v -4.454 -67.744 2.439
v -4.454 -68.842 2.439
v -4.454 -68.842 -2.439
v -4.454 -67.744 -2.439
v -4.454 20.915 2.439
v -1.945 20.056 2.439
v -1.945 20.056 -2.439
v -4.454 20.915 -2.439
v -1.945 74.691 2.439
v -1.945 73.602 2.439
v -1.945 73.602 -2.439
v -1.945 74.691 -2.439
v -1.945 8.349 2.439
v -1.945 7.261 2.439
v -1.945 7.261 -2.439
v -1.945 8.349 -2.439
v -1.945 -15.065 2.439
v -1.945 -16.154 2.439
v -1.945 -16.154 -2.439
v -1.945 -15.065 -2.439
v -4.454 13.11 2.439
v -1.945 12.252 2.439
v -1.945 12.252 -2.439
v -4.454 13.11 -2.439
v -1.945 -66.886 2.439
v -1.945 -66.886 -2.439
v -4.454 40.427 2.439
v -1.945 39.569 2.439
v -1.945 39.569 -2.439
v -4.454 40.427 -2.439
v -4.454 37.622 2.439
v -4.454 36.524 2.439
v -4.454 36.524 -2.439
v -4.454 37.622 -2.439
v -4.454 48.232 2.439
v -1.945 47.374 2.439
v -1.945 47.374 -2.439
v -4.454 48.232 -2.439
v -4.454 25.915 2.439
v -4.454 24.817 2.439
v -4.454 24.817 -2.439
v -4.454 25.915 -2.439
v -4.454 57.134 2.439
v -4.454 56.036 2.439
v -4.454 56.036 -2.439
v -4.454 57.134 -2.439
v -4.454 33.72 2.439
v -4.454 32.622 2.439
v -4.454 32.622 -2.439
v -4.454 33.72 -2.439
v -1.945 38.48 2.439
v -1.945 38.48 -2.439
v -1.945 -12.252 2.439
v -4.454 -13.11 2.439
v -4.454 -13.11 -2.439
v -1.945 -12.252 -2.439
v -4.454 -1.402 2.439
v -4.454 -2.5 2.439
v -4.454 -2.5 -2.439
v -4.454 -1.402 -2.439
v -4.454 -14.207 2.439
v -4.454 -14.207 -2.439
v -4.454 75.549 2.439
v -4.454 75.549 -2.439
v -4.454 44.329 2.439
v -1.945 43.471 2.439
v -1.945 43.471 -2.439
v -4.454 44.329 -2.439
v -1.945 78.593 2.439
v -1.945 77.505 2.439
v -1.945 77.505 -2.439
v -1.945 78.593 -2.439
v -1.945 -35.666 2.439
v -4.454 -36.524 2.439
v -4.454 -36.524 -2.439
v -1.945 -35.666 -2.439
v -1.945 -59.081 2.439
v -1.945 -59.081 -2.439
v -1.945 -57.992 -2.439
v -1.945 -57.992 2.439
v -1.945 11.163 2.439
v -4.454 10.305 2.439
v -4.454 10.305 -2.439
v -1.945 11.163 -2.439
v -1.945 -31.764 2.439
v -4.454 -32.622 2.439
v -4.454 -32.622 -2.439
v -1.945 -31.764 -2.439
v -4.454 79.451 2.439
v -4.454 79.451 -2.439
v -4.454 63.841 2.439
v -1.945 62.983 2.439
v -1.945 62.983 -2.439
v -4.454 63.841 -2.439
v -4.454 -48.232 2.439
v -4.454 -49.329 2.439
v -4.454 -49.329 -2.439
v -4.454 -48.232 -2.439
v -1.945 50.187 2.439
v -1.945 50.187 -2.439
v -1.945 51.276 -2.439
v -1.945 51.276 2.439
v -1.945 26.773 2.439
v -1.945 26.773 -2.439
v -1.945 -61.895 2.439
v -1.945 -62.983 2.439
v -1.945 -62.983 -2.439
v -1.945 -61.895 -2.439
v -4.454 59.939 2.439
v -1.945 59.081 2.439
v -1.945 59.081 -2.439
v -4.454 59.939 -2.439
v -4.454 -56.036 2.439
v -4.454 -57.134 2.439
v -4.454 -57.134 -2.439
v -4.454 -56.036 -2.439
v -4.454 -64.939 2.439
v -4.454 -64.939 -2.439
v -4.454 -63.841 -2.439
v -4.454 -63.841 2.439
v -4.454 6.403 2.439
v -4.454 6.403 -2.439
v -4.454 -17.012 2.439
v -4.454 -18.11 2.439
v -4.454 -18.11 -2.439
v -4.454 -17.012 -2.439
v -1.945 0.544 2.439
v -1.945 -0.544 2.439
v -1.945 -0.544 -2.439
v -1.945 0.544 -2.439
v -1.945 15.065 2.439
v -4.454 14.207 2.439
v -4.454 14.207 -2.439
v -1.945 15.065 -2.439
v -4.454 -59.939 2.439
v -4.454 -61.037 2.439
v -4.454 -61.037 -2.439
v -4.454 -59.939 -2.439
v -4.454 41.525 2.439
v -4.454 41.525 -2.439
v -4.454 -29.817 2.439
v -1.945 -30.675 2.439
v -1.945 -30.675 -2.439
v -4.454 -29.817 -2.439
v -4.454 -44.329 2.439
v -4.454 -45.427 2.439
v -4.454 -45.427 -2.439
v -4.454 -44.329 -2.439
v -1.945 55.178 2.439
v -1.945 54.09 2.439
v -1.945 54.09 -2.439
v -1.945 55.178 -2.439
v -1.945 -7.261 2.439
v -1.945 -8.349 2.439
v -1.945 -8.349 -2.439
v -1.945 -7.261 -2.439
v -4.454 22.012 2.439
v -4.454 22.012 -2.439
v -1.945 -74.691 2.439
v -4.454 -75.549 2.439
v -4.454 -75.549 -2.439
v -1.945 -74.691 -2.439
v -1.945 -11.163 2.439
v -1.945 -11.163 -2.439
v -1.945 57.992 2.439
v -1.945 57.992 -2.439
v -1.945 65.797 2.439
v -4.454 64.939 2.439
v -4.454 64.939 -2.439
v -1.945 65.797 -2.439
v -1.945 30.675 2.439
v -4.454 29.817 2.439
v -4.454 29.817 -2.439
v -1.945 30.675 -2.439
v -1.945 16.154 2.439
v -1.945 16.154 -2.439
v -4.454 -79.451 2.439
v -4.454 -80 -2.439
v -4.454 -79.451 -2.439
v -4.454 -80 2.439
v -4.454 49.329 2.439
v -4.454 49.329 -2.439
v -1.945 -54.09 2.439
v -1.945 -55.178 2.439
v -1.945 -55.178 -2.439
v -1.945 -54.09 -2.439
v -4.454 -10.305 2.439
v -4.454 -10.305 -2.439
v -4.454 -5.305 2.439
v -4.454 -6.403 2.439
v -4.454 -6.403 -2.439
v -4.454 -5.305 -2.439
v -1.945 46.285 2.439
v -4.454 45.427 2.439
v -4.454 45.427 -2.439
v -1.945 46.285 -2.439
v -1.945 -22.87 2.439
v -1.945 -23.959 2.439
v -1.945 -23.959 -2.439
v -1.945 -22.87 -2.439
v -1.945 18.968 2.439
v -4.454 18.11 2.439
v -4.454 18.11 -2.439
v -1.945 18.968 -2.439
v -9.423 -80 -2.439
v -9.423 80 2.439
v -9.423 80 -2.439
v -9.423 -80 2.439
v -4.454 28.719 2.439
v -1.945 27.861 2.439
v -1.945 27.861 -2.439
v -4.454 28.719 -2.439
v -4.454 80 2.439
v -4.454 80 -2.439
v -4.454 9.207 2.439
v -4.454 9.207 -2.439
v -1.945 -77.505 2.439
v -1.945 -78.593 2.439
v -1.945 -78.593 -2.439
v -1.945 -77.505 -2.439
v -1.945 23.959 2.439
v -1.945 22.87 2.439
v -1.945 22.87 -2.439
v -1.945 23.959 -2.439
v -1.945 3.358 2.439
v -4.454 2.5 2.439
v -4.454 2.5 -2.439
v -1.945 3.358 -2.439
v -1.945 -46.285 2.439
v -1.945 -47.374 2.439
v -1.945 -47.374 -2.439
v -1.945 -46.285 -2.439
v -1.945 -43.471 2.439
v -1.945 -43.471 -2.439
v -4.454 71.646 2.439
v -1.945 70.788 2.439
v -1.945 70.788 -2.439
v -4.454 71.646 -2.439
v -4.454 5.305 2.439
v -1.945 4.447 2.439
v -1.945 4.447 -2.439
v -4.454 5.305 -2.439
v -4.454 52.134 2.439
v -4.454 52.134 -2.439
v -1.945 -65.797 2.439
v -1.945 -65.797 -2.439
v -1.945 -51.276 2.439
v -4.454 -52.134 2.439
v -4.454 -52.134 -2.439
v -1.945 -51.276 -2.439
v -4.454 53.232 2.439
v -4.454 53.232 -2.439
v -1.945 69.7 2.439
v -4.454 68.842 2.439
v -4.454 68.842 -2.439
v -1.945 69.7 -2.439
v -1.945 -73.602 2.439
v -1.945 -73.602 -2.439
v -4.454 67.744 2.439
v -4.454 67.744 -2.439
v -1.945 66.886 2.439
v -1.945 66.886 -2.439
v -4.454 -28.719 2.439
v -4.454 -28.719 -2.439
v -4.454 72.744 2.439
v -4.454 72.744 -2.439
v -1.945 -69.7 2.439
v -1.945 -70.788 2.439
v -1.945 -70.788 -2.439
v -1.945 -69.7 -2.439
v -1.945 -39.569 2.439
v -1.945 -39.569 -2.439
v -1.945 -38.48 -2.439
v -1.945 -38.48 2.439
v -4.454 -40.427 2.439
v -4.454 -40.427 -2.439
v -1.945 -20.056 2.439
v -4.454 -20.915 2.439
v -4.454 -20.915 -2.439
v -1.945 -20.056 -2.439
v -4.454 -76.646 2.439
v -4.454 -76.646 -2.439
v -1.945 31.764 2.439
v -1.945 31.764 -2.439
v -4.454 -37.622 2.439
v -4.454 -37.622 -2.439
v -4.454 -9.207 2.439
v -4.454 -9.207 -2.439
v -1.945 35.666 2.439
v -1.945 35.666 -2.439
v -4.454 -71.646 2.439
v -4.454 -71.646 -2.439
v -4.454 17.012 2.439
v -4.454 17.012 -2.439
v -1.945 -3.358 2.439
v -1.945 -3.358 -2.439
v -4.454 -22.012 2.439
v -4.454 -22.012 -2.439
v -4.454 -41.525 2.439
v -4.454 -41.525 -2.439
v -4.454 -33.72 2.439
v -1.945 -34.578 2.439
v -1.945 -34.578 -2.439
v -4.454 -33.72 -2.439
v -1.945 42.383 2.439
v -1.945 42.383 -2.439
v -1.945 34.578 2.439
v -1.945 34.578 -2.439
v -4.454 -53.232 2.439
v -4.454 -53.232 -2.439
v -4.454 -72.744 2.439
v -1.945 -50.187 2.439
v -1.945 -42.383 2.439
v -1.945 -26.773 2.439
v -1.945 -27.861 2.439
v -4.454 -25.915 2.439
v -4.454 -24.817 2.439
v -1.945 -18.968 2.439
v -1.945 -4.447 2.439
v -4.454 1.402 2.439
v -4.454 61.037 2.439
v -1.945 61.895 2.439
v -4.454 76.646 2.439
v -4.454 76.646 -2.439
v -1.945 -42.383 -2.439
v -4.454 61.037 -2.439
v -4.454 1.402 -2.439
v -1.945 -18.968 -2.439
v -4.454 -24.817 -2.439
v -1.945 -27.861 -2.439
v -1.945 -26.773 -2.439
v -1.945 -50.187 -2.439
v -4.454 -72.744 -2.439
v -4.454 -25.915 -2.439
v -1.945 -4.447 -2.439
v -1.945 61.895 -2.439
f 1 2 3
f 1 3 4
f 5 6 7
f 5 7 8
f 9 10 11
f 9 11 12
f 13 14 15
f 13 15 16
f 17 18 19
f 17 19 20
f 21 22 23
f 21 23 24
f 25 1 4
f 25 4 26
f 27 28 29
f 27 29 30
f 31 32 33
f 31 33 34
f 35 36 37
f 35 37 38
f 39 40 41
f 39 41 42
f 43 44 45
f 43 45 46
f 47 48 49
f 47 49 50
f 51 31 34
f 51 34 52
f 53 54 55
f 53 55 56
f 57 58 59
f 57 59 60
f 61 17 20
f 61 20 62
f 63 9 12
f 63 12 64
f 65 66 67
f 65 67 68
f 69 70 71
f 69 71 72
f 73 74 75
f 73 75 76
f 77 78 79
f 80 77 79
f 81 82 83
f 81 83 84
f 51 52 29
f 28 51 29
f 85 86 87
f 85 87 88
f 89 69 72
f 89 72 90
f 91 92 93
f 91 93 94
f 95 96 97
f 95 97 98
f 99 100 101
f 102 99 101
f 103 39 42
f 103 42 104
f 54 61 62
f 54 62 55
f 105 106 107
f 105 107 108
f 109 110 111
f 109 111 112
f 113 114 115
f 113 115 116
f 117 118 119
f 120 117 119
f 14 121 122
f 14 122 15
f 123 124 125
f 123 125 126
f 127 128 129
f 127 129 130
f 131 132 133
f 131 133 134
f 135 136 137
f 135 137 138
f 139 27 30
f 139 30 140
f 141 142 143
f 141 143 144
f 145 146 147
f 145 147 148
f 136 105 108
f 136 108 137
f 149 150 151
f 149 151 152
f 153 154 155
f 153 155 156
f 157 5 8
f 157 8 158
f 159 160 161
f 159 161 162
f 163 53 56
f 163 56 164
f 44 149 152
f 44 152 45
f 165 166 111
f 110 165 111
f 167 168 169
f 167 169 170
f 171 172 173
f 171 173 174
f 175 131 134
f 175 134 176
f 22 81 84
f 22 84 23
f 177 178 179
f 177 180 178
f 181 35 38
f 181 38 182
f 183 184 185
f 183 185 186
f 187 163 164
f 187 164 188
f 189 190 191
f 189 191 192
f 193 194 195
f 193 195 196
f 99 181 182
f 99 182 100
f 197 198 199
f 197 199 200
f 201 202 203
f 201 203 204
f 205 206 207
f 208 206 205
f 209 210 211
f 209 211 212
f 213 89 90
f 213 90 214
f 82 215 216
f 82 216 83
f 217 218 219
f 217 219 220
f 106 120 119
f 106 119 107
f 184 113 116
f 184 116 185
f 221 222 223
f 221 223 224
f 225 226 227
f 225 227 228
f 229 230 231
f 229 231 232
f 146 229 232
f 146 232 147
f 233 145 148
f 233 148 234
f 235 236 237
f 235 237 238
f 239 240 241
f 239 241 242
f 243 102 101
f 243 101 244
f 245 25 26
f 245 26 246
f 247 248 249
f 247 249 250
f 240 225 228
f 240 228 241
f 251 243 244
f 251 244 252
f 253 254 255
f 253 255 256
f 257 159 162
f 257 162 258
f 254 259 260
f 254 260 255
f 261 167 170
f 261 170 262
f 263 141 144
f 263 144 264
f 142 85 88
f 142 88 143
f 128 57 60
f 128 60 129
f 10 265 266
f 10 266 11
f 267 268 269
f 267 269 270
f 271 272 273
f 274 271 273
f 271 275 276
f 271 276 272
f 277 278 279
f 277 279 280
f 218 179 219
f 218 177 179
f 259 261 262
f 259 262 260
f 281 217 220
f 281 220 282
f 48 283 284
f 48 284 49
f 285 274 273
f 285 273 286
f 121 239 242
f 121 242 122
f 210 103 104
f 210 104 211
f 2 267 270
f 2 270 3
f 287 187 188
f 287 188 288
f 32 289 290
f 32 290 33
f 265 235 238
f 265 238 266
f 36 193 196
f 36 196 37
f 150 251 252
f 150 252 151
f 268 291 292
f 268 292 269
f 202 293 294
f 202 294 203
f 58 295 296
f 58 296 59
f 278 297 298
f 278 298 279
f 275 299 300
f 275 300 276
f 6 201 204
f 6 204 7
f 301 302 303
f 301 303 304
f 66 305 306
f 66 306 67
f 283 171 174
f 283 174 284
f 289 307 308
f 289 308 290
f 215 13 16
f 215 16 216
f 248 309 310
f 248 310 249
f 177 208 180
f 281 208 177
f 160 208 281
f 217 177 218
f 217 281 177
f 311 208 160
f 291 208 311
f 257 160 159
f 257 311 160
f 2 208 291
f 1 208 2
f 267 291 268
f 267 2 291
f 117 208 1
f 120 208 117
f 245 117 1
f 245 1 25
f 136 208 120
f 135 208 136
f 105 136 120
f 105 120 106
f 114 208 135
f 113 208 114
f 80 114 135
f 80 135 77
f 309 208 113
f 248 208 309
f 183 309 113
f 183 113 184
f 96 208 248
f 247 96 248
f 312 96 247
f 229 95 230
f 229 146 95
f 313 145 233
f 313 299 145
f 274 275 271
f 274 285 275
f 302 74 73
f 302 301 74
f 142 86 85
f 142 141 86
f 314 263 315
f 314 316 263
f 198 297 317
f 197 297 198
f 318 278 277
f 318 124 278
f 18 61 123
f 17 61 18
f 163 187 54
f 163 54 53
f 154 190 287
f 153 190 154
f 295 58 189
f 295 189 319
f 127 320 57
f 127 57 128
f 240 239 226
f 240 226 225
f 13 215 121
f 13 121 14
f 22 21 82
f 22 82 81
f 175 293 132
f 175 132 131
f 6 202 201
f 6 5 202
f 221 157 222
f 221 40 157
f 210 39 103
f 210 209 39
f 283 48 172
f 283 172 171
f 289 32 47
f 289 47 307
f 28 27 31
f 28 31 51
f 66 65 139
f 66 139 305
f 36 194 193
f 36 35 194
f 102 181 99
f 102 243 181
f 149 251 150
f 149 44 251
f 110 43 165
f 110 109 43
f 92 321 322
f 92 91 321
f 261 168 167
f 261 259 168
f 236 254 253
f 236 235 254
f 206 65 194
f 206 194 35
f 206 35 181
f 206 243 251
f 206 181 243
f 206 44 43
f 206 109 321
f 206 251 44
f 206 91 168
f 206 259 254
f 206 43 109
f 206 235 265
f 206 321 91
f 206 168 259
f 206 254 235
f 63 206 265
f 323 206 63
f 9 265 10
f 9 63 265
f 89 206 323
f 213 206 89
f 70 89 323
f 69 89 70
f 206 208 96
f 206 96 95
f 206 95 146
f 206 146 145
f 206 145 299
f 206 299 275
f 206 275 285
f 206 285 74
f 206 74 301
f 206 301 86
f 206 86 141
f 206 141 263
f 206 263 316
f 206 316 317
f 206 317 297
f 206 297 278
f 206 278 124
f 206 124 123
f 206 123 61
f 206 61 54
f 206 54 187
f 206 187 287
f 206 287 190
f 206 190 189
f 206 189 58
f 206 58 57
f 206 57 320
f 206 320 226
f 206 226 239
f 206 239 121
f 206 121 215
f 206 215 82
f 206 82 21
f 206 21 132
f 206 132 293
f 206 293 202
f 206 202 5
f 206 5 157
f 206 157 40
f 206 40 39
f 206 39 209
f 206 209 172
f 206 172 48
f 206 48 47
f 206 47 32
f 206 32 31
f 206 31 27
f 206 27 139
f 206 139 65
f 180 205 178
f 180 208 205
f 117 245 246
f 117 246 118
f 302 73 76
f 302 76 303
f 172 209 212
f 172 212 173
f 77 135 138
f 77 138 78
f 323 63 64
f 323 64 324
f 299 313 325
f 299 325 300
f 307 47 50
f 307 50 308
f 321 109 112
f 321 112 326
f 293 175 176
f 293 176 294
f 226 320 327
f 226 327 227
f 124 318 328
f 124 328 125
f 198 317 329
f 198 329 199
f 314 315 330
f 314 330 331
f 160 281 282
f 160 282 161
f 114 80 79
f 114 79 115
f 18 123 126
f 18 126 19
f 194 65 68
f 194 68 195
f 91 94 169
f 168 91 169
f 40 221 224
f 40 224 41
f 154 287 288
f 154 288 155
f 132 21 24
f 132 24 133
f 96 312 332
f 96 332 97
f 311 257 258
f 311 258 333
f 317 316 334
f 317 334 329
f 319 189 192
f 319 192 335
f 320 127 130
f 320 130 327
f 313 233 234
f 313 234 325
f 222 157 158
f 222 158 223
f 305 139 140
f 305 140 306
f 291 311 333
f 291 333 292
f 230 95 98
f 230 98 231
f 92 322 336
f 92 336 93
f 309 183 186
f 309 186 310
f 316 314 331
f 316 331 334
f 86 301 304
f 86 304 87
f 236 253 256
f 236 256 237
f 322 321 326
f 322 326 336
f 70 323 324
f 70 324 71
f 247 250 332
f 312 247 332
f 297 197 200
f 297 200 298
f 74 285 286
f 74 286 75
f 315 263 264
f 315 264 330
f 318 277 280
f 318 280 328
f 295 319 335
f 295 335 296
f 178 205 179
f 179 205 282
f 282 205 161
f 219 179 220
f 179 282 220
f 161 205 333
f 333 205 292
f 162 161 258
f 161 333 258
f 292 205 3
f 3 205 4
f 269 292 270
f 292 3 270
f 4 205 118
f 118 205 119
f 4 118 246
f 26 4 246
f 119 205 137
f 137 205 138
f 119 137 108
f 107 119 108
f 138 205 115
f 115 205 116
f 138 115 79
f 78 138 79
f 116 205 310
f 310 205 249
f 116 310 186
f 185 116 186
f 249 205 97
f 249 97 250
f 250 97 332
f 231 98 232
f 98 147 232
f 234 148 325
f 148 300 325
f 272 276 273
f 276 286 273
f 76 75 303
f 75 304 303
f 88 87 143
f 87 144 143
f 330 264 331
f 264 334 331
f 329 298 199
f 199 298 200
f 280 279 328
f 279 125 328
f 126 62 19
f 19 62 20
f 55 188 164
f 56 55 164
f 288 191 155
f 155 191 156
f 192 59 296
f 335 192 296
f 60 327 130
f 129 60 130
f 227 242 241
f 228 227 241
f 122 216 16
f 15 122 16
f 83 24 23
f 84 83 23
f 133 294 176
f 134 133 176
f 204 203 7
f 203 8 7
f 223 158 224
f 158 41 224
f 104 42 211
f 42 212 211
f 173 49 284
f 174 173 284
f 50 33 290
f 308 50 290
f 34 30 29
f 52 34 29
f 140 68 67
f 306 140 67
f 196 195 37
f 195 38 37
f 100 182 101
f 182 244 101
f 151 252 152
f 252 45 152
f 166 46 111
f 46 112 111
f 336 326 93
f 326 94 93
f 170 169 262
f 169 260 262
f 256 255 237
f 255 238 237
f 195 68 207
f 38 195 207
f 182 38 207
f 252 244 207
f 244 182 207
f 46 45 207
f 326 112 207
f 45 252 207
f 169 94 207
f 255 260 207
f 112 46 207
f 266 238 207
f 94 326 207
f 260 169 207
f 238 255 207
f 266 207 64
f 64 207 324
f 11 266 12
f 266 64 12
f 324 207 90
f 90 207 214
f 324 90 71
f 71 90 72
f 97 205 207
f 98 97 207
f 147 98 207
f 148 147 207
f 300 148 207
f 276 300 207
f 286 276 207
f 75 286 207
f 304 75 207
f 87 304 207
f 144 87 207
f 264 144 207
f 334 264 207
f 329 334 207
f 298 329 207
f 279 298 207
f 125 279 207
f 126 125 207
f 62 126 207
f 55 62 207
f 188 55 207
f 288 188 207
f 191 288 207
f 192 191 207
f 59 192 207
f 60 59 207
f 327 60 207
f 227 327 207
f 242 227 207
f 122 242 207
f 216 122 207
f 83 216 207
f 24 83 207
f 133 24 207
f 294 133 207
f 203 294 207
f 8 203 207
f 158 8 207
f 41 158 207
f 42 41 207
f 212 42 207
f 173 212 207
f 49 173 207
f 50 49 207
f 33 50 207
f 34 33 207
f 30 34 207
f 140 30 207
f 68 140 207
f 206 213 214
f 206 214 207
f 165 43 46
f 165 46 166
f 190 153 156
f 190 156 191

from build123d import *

# Parameters (mm, degrees)
RESSALTO_EXTRUS_O1_DEPTH = 5
SCALE2_SCALE             = 0.487804878


with BuildPart() as part:
    # Esboço1 → Ressalto-extrusão1 (new, symmetric)
    with BuildSketch(Plane.XY):
        Polygon((-2.596479089, -162.874745928), (2.546479089, -161.115750635), (2.546479089, -158.884249365), (-2.596479089, -157.125254072), (-2.596479089, -154.874745928), (2.546479089, -153.115750635), (2.546479089, -150.884249365), (-2.596479089, -149.125254072), (-2.596479089, -146.874745928), (2.546479089, -145.115750635), (2.546479089, -142.884249365), (-2.596479089, -141.125254072), (-2.596479089, -138.874745928), (2.546479089, -137.115750635), (2.546479089, -134.884249365), (-2.596479089, -133.125254072), (-2.596479089, -130.874745928), (2.546479089, -129.115750635), (2.546479089, -126.884249365), (-2.596479089, -125.125254072), (-2.596479089, -122.874745928), (2.546479089, -121.115750635), (2.546479089, -118.884249365), (-2.596479089, -117.125254072), (-2.596479089, -114.874745928), (2.546479089, -113.115750635), (2.546479089, -110.884249365), (-2.596479089, -109.125254072), (-2.596479089, -106.874745928), (2.546479089, -105.115750635), (2.546479089, -102.884249365), (-2.596479089, -101.125254072), (-2.596479089, -98.874745928), (2.546479089, -97.115750635), (2.546479089, -94.884249365), (-2.596479089, -93.125254072), (-2.596479089, -90.874745928), (2.546479089, -89.115750635), (2.546479089, -86.884249365), (-2.596479089, -85.125254072), (-2.596479089, -82.874745928), (2.546479089, -81.115750635), (2.546479089, -78.884249365), (-2.596479089, -77.125254072), (-2.596479089, -74.874745928), (2.546479089, -73.115750635), (2.546479089, -70.884249365), (-2.596479089, -69.125254072), (-2.596479089, -66.874745928), (2.546479089, -65.115750635), (2.546479089, -62.884249365), (-2.596479089, -61.125254072), (-2.596479089, -58.874745928), (2.546479089, -57.115750635), (2.546479089, -54.884249365), (-2.596479089, -53.125254072), (-2.596479089, -50.874745928), (2.546479089, -49.115750635), (2.546479089, -46.884249365), (-2.596479089, -45.125254072), (-2.596479089, -42.874745928), (2.546479089, -41.115750635), (2.546479089, -38.884249365), (-2.596479089, -37.125254072), (-2.596479089, -34.874745928), (2.546479089, -33.115750635), (2.546479089, -30.884249365), (-2.596479089, -29.125254072), (-2.596479089, -26.874745928), (2.546479089, -25.115750635), (2.546479089, -22.884249365), (-2.596479089, -21.125254072), (-2.596479089, -18.874745928), (2.546479089, -17.115750635), (2.546479089, -14.884249365), (-2.596479089, -13.125254072), (-2.596479089, -10.874745928), (2.546479089, -9.115750635), (2.546479089, -6.884249365), (-2.596479089, -5.125254072), (-2.596479089, -2.874745928), (2.546479089, -1.115750635), (2.546479089, 1.115750635), (-2.596479089, 2.874745928), (-2.596479089, 5.125254072), (2.546479089, 6.884249365), (2.546479089, 9.115750635), (-2.596479089, 10.874745928), (-2.596479089, 13.125254072), (2.546479089, 14.884249365), (2.546479089, 17.115750635), (-2.596479089, 18.874745928), (-2.596479089, 21.125254072), (2.546479089, 22.884249365), (2.546479089, 25.115750635), (-2.596479089, 26.874745928), (-2.596479089, 29.125254072), (2.546479089, 30.884249365), (2.546479089, 33.115750635), (-2.596479089, 34.874745928), (-2.596479089, 37.125254072), (2.546479089, 38.884249365), (2.546479089, 41.115750635), (-2.596479089, 42.874745928), (-2.596479089, 45.125254072), (2.546479089, 46.884249365), (2.546479089, 49.115750635), (-2.596479089, 50.874745928), (-2.596479089, 53.125254072), (2.546479089, 54.884249365), (2.546479089, 57.115750635), (-2.596479089, 58.874745928), (-2.596479089, 61.125254072), (2.546479089, 62.884249365), (2.546479089, 65.115750635), (-2.596479089, 66.874745928), (-2.596479089, 69.125254072), (2.546479089, 70.884249365), (2.546479089, 73.115750635), (-2.596479089, 74.874745928), (-2.596479089, 77.125254072), (2.546479089, 78.884249365), (2.546479089, 81.115750635), (-2.596479089, 82.874745928), (-2.596479089, 85.125254072), (2.546479089, 86.884249365), (2.546479089, 89.115750635), (-2.596479089, 90.874745928), (-2.596479089, 93.125254072), (2.546479089, 94.884249365), (2.546479089, 97.115750635), (-2.596479089, 98.874745928), (-2.596479089, 101.125254072), (2.546479089, 102.884249365), (2.546479089, 105.115750635), (-2.596479089, 106.874745928), (-2.596479089, 109.125254072), (2.546479089, 110.884249365), (2.546479089, 113.115750635), (-2.596479089, 114.874745928), (-2.596479089, 117.125254072), (2.546479089, 118.884249365), (2.546479089, 121.115750635), (-2.596479089, 122.874745928), (-2.596479089, 125.125254072), (2.546479089, 126.884249365), (2.546479089, 129.115750635), (-2.596479089, 130.874745928), (-2.596479089, 133.125254072), (2.546479089, 134.884249365), (2.546479089, 137.115750635), (-2.596479089, 138.874745928), (-2.596479089, 141.125254072), (2.546479089, 142.884249365), (2.546479089, 145.115750635), (-2.596479089, 146.874745928), (-2.596479089, 149.125254072), (2.546479089, 150.884249365), (2.546479089, 153.115750635), (-2.596479089, 154.874745928), (-2.596479089, 157.125254072), (2.546479089, 158.884249365), (2.546479089, 161.115750635), (-2.596479089, 162.874745928), (-2.596479089, 164), (-12.782395447, 164), (-12.782395447, -164), (-2.596479089, -164), align=None)
    extrude(amount=RESSALTO_EXTRUS_O1_DEPTH, both=True)


with BuildPart() as part_1:
    # Scale2: scaled about (-6.22348049, 0, 0)
    add(part.part.scale(SCALE2_SCALE).moved(Location((-3.187636349, 0, 0))))


solid = part_1.part
